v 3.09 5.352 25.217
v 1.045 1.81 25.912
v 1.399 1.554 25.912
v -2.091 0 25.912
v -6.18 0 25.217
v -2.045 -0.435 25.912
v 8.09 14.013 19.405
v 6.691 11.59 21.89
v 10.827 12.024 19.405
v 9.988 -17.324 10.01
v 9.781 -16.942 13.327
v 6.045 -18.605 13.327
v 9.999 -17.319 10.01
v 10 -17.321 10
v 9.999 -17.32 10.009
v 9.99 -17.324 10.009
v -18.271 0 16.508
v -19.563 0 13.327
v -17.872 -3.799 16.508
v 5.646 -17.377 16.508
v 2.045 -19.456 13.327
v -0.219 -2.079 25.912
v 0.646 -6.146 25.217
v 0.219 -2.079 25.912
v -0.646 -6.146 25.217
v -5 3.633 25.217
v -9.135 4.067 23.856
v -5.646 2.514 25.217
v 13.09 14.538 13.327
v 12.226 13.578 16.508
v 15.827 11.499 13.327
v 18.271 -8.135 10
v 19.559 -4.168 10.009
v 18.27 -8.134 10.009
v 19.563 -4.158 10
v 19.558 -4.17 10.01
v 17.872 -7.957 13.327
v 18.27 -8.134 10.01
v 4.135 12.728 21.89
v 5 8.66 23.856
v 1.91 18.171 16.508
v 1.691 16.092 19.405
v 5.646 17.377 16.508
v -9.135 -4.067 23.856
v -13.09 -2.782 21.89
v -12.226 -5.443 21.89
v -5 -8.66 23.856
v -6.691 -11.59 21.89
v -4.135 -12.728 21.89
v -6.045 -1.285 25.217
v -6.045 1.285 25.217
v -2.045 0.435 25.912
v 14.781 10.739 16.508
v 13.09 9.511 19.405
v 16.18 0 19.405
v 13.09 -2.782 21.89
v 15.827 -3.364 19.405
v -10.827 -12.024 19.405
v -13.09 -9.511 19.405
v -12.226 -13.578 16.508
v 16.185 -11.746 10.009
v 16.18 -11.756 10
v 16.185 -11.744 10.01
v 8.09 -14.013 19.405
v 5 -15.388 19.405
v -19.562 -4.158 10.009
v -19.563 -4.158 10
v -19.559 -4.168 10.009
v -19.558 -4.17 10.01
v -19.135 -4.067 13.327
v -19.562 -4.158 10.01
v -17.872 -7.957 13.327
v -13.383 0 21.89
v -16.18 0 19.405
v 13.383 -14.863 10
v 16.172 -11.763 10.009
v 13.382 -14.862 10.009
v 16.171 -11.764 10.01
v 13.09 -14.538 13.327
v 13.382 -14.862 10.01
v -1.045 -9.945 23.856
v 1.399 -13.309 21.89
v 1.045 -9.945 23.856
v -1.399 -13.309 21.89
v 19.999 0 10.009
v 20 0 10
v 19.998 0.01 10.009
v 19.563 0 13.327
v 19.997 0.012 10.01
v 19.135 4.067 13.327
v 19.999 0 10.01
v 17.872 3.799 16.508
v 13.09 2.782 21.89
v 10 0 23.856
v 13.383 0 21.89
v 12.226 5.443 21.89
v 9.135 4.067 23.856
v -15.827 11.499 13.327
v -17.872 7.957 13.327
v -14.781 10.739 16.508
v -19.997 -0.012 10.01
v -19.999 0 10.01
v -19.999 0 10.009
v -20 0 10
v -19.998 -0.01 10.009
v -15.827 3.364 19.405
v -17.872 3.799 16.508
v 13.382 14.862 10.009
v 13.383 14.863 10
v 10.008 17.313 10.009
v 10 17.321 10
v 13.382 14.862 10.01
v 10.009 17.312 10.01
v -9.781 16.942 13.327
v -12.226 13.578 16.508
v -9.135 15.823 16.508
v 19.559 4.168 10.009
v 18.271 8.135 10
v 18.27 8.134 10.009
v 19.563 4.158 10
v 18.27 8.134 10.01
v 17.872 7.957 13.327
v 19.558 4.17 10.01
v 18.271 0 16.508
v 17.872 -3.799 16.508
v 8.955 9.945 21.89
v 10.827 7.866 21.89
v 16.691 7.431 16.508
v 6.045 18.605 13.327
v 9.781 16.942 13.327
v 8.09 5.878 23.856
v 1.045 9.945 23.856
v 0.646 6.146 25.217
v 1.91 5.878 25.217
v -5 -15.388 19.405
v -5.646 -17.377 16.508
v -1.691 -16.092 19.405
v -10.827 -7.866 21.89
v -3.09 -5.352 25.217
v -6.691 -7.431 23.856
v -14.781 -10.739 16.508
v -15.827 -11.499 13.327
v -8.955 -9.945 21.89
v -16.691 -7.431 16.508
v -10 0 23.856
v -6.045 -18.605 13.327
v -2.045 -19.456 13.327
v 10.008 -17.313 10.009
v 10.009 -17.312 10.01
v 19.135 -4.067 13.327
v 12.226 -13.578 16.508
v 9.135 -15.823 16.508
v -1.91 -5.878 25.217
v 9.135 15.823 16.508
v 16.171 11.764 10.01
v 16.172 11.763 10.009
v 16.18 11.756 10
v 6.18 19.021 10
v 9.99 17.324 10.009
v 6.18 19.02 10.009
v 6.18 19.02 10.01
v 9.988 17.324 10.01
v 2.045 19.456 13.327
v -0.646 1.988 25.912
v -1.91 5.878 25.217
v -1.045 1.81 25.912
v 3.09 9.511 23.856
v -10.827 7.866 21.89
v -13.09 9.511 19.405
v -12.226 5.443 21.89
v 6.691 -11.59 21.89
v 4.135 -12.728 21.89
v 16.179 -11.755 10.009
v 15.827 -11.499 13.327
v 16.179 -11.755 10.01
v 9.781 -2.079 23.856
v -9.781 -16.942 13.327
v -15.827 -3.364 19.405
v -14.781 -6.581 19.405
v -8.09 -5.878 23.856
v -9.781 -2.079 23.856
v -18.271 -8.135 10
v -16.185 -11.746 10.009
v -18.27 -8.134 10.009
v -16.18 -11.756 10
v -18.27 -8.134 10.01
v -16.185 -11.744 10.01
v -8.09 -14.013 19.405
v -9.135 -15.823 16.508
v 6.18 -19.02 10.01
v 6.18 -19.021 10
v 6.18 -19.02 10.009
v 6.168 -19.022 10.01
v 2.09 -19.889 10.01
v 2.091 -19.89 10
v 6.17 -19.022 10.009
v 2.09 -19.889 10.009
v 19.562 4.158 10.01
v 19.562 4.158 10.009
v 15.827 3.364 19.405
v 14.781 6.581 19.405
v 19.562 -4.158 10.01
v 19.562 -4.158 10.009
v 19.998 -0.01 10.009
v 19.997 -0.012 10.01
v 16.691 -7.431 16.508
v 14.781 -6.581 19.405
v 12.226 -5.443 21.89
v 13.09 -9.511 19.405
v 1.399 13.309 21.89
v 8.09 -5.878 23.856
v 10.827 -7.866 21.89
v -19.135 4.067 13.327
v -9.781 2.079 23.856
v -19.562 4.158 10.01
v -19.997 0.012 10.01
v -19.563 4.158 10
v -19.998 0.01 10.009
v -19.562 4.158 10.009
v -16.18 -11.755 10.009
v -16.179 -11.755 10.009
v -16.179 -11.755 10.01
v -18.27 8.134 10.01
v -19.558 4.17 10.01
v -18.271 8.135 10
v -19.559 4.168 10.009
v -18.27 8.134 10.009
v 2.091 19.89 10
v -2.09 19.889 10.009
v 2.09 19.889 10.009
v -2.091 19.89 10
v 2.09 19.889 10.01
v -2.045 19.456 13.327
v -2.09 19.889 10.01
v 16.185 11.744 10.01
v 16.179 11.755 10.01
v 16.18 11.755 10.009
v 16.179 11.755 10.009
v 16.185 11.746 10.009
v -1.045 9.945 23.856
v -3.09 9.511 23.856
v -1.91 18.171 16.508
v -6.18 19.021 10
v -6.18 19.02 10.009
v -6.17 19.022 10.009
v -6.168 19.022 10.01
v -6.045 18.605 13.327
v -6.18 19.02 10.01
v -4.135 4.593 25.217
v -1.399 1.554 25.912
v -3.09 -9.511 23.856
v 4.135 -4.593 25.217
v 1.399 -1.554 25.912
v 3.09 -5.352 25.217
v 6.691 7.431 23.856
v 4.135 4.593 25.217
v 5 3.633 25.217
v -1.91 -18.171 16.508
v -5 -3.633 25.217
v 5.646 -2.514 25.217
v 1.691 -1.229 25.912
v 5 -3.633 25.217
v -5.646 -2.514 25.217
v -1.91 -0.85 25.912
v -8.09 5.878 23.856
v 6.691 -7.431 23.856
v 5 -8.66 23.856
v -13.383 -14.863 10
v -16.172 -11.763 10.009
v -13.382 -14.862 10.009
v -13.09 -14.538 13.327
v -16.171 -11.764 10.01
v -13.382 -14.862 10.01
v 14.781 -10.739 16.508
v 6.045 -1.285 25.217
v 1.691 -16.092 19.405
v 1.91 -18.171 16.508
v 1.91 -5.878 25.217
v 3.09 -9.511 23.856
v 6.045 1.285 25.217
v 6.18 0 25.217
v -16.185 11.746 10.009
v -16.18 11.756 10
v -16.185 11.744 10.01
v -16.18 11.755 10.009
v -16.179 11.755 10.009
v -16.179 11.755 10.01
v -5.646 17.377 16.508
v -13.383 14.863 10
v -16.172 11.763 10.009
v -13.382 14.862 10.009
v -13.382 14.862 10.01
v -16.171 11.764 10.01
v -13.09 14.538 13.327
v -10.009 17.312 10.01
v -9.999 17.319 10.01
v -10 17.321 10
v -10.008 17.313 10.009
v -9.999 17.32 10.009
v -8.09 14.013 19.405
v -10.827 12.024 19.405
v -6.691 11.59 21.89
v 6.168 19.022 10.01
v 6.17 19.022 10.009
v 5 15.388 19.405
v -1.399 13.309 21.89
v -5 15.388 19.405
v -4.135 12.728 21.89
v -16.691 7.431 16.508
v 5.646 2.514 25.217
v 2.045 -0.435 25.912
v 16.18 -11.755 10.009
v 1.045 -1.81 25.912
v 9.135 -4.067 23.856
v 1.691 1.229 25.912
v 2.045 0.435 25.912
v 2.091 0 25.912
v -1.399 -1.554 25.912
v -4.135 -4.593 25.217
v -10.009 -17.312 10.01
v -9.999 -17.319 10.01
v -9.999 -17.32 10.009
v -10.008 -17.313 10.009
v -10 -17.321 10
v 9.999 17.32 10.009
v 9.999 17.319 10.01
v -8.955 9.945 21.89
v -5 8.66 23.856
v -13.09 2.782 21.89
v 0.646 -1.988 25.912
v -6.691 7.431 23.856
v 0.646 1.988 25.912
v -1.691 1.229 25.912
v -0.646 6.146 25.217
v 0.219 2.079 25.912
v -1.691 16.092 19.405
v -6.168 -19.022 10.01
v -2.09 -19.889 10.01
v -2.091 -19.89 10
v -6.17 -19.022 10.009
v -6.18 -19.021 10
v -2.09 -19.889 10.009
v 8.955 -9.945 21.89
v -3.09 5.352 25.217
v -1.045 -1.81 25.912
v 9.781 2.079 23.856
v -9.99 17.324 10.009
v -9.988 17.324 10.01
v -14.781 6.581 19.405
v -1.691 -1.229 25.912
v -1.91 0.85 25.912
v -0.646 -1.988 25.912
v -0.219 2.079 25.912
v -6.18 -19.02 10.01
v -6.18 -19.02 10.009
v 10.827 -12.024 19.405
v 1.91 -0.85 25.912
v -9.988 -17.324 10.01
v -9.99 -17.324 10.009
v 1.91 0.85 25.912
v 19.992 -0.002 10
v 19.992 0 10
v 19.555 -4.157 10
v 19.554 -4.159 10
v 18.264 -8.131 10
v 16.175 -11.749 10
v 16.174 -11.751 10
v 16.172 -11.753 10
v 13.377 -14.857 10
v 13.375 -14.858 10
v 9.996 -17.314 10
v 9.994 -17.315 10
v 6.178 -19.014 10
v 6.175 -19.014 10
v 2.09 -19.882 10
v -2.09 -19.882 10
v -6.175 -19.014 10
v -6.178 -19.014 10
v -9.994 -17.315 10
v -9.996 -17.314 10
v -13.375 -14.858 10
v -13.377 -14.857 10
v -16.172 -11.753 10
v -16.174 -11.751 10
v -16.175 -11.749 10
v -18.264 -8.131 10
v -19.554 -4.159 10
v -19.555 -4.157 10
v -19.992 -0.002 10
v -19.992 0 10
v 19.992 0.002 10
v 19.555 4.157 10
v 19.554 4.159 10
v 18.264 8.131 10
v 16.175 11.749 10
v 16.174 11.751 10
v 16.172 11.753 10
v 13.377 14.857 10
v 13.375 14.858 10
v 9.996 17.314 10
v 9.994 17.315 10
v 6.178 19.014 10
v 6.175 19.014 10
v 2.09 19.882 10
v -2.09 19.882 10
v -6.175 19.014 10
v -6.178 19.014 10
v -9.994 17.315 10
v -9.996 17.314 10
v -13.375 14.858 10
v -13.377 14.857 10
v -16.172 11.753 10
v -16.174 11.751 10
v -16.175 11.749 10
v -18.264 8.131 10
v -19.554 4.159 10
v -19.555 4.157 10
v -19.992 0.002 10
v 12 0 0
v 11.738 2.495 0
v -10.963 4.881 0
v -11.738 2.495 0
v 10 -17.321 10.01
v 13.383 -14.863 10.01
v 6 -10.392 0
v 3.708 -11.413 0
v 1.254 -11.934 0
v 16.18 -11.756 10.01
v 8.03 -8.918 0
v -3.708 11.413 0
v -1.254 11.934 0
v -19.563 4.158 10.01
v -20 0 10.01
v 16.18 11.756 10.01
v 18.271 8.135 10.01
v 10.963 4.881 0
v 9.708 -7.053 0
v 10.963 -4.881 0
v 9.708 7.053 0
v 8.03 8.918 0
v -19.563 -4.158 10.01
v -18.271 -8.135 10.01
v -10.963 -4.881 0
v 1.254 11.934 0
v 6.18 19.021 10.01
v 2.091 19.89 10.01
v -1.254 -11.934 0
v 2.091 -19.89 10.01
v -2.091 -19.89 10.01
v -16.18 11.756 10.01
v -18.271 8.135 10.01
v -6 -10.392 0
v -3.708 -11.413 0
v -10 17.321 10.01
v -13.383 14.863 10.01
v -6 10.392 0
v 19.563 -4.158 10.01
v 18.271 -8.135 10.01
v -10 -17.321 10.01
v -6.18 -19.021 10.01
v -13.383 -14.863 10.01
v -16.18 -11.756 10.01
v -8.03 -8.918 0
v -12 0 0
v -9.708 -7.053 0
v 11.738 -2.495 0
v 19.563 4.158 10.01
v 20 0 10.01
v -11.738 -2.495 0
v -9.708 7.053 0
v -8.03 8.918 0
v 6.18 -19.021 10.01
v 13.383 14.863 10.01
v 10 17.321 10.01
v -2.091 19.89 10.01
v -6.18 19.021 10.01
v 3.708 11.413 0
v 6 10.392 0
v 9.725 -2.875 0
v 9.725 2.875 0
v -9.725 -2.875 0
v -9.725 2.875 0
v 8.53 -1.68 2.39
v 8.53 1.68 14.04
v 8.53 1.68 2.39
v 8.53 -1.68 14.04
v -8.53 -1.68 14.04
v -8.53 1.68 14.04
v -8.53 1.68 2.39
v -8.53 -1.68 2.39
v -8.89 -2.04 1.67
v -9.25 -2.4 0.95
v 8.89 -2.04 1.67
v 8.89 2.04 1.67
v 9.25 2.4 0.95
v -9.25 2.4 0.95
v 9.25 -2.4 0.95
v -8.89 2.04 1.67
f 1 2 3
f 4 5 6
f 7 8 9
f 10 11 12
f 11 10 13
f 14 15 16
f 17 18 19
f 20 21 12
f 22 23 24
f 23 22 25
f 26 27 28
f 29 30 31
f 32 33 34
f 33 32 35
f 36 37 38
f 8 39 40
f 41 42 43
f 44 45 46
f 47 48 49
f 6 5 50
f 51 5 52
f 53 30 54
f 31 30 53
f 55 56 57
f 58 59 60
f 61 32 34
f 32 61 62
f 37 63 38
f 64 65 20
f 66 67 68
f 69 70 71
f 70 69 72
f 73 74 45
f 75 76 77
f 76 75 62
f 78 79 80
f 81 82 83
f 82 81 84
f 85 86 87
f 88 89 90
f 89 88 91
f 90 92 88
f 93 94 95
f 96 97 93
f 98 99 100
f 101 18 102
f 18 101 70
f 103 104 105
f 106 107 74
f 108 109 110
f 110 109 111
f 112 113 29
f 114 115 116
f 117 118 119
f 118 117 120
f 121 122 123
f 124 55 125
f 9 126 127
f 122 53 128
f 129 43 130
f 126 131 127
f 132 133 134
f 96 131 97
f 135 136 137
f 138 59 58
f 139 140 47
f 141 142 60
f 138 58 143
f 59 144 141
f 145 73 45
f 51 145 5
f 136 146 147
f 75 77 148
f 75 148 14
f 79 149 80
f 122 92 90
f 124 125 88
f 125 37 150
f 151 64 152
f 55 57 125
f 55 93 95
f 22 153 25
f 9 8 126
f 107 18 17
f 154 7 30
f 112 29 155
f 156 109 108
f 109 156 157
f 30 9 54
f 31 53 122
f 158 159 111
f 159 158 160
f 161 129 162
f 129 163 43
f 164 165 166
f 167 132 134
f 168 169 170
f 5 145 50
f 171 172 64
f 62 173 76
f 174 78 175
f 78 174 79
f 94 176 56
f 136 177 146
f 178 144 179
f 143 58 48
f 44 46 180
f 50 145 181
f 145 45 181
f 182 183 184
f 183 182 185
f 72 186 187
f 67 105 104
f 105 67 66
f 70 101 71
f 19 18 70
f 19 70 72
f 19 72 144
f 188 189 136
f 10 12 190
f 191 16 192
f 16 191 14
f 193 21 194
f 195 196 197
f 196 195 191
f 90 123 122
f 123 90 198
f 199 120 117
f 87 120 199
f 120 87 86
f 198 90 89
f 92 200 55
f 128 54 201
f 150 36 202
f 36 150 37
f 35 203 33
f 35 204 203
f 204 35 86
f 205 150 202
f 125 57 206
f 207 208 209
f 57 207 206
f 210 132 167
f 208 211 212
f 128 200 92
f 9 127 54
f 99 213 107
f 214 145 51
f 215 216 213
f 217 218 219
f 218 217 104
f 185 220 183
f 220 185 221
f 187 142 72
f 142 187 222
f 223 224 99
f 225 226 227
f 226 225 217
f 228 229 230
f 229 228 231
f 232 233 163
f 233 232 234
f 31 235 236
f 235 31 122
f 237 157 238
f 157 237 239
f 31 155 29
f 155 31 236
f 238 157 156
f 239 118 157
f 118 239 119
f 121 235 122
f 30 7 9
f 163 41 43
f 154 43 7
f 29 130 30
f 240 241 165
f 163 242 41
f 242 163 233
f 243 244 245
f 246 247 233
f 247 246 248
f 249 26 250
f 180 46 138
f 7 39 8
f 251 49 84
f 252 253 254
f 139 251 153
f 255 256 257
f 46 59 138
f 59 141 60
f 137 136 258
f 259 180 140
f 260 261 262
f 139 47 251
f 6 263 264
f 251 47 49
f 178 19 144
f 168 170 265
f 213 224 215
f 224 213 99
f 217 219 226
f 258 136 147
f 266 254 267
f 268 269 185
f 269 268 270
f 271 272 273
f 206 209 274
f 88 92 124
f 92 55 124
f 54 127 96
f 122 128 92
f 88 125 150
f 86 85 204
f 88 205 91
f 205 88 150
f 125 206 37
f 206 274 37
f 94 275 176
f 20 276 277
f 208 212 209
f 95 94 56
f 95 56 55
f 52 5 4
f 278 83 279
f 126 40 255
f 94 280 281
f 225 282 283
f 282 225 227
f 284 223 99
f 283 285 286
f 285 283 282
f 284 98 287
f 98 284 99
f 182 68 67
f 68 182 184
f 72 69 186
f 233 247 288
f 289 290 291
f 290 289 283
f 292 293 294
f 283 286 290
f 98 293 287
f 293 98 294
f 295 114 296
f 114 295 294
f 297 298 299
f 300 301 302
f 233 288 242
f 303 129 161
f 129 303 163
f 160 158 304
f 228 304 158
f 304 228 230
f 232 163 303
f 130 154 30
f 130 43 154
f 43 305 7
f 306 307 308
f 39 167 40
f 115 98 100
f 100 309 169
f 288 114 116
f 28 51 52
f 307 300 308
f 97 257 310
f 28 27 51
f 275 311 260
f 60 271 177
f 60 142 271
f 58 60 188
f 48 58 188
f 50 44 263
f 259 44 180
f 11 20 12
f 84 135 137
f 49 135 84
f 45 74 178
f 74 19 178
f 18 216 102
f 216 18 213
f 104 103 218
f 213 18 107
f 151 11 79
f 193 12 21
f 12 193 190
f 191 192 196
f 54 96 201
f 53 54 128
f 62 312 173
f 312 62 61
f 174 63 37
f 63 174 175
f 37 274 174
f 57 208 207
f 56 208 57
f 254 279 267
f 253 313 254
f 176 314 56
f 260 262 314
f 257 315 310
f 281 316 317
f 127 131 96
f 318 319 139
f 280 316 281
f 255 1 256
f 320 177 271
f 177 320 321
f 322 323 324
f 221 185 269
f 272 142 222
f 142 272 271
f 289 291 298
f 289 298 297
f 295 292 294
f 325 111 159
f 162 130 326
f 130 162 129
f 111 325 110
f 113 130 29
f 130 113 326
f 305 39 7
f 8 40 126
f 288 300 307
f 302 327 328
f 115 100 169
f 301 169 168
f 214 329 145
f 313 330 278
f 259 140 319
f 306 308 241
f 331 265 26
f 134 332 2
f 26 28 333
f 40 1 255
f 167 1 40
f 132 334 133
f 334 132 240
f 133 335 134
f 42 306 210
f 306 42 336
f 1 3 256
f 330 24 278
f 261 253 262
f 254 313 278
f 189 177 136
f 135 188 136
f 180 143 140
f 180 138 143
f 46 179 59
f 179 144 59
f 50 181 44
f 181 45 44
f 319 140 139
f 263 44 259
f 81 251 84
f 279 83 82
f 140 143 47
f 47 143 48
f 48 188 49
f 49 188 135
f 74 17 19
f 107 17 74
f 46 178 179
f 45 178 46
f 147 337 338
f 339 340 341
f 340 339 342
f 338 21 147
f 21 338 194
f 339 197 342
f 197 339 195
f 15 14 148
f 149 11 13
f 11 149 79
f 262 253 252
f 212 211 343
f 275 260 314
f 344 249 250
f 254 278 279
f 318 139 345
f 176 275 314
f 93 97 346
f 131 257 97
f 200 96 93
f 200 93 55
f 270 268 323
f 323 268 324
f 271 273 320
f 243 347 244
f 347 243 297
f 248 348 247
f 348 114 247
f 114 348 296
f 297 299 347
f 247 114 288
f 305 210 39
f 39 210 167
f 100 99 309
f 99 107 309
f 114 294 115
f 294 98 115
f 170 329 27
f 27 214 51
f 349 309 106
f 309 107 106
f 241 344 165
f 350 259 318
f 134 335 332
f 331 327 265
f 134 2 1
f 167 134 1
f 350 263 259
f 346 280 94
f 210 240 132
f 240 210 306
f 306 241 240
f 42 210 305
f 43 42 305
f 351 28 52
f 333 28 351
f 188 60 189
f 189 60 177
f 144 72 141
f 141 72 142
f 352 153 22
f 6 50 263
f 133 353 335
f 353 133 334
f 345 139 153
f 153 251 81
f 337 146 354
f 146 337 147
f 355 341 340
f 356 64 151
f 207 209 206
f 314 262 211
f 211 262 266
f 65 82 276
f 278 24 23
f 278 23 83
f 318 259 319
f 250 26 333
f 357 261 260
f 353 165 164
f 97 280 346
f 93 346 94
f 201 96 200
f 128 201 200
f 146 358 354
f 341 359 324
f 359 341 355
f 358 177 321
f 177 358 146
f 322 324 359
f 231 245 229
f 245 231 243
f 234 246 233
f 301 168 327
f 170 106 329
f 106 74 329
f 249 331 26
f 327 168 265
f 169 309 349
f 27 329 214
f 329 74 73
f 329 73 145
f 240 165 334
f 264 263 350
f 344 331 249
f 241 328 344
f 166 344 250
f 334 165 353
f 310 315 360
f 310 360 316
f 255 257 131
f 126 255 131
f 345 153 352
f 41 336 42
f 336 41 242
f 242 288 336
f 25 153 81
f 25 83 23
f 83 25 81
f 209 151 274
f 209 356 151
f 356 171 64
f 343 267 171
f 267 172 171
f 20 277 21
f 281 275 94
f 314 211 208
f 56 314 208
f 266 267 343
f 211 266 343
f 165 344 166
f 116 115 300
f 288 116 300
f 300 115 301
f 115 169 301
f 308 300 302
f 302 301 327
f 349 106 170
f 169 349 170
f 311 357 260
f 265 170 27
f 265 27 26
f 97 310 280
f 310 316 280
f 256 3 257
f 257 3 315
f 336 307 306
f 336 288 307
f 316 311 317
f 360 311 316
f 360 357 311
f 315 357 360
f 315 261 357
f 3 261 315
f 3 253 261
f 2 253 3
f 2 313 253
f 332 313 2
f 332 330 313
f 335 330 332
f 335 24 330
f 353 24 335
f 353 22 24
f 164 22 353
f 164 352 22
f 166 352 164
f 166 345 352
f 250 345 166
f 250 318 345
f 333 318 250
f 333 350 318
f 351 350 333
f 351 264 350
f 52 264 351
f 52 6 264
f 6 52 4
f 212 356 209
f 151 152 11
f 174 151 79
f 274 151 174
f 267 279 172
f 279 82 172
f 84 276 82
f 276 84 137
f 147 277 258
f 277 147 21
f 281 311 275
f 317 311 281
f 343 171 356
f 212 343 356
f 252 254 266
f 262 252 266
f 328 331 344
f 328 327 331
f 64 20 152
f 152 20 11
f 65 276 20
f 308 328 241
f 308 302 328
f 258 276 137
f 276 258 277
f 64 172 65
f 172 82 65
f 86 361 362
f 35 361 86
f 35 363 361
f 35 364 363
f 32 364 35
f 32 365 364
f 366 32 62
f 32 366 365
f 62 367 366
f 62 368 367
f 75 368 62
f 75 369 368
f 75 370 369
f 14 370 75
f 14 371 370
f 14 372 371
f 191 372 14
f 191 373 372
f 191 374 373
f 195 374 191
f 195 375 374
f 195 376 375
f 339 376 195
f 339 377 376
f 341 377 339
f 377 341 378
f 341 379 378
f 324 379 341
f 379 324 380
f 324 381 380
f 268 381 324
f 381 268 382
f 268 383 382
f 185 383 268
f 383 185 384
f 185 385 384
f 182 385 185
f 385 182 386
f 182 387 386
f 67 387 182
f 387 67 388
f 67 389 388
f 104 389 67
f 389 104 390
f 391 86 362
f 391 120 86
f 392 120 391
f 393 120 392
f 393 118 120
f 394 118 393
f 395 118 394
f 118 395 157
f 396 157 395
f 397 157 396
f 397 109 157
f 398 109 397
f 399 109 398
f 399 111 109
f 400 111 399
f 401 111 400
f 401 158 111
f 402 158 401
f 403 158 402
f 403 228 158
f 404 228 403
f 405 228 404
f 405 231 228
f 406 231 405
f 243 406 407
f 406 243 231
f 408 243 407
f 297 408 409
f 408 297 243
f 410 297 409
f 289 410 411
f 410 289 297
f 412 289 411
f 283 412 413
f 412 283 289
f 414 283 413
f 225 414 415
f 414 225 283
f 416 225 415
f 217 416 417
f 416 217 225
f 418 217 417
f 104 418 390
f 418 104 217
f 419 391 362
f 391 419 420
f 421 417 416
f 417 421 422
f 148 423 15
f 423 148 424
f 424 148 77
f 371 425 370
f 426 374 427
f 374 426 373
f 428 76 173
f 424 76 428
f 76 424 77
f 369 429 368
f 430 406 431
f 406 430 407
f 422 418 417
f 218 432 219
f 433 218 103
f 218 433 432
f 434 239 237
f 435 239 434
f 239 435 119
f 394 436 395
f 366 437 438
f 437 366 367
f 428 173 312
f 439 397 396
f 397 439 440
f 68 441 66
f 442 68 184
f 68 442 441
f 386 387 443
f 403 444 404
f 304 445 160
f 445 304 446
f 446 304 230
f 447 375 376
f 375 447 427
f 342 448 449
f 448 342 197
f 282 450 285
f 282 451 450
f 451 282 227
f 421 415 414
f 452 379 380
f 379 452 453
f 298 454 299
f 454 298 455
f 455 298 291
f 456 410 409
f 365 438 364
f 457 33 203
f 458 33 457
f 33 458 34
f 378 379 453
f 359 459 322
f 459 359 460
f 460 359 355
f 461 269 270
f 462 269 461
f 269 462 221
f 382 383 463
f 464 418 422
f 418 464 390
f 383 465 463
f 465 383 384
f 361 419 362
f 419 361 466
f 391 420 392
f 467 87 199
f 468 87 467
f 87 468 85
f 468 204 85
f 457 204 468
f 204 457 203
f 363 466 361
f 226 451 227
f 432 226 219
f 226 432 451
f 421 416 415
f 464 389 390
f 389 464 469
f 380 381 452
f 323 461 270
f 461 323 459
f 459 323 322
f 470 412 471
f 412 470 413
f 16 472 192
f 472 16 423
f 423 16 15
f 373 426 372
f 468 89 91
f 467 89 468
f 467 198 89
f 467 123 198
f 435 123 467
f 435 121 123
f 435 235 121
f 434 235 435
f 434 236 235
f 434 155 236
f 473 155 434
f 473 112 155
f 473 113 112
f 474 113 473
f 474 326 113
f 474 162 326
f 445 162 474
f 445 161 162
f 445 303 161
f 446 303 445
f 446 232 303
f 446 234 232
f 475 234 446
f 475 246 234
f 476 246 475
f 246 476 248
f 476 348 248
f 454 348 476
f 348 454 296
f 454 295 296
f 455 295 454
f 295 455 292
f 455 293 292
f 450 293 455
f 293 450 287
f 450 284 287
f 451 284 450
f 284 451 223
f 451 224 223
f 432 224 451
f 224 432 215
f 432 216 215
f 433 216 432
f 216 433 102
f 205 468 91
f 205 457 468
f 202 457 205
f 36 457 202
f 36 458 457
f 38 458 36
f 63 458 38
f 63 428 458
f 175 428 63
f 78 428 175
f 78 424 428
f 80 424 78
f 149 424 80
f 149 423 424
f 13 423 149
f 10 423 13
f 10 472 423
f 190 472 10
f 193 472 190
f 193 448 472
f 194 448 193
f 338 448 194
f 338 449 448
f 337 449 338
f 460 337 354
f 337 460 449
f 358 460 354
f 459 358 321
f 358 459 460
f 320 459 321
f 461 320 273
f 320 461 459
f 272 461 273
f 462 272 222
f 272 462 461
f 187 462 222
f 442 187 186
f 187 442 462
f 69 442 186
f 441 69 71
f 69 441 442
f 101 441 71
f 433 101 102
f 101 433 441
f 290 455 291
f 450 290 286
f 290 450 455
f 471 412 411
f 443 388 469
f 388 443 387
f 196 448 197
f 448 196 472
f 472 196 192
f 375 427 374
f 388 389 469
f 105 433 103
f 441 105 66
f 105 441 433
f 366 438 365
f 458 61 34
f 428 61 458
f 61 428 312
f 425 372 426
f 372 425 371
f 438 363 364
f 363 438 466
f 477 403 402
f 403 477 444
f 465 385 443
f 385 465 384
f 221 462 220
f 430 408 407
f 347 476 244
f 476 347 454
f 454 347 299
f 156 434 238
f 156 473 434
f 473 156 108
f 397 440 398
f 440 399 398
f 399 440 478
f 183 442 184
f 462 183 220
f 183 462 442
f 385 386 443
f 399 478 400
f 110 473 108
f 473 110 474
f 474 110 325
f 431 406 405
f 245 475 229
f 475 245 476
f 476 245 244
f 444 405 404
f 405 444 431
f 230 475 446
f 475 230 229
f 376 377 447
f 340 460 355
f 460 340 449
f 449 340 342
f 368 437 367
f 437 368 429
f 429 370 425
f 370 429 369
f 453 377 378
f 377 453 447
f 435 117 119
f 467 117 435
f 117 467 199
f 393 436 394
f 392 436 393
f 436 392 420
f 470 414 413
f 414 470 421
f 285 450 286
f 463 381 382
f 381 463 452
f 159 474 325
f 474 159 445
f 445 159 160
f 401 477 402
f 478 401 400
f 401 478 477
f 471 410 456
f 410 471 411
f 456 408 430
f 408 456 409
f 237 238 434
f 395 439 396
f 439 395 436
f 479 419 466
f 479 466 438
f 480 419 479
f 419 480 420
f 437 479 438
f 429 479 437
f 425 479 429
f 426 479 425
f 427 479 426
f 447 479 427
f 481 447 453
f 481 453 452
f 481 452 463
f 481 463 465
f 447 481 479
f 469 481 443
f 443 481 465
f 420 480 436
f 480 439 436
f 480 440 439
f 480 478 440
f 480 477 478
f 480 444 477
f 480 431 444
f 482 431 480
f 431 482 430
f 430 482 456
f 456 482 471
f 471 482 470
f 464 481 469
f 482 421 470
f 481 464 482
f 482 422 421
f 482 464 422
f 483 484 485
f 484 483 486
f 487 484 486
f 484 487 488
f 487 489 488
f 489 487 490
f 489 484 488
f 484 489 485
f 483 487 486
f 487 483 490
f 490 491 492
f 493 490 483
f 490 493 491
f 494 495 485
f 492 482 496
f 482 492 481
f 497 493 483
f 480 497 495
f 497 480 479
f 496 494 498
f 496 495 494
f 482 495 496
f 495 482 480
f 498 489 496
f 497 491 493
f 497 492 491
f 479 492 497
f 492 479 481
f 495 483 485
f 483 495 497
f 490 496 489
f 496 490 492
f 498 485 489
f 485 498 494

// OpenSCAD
// file: triangulation.scad
function _furthestAwayFromPoint(points,poly,z,bestD=-1,bestPos=0,pos=0) = 
    len(poly) <= pos ? bestPos :
    norm(points[poly[pos]]-z) > bestD ? _furthestAwayFromPoint(points,poly,z,bestD=norm(points[poly[pos]]-z),bestPos=pos,pos=pos+1) :
    _furthestAwayFromPoint(points,poly,z,bestD=bestD,bestPos=bestPos,pos=pos+1);
    
function _triangleArea(a,b,c) = let(cr=cross(b-a,c-a)/2)
        is_num(cr) ? abs(cr) : norm(cr);
    
function _furthestAwayFromLine(points,poly,z1,z2,bestArea=-1,bestPos=0,pos=0) = 
    len(poly) <= pos ? bestPos :
    _triangleArea(z1,z2,points[poly[pos]]) > bestArea ? _furthestAwayFromLine(points,poly,z1,z2,bestArea=_triangleArea(z1,z2,points[poly[pos]]),bestPos=pos,pos=pos+1) :
    _furthestAwayFromLine(points,poly,z1,z2,bestArea=bestArea,bestPos=bestPos,pos=pos+1);
    
function normalize(v) = v/norm(v);

function _winding(points,poly,sum=0,pos=0) =
    pos >= len(poly) ? sum :
    _winding(points,poly,sum=sum+(points[poly[(pos+1)%len(poly)]][0]-points[poly[pos]][0])*(points[poly[(pos+1)%len(poly)]][1]+points[poly[pos]][1]),pos=pos+1);

function _isCCW(points,poly) =
_winding(points,poly) < 0;

function identifyPlane(points,poly) = 
let(i=_furthestAwayFromPoint(points,poly,points[poly[0]]),
           j=_furthestAwayFromLine(points,poly,points[poly[0]],points[poly[i]]),
           normal = cross(points[poly[i]]-points[poly[0]],points[poly[j]]-points[poly[0]]),
           a = points[poly[i]]-points[poly[0]],
           b = cross(normal,a),
           cs = [points[poly[0]],normalize(a),normalize(b),normalize(normal)])
           cs;
                      
function projectPoint(coordsys,p) = let(v=p-coordsys[0],
           vp=v-(v*coordsys[3])*coordsys[3]) [vp*coordsys[1],vp*coordsys[2]];
           
function projectPoints(coordsys,p) = [for(v=p) projectPoint(coordsys,v)];
    
function _removeDuplicates(points,poly)
    = [for (i=[0:len(poly)-1]) if (points[poly[(i+1)%len(poly)]] != points[poly[i]]) poly[i]];
    
function triangulate(points,poly=undef,holes=[]) = 
    let(poly = poly==undef ? [for(i=[0:1:len(points)-1]) i] : poly)
    let(poly = _removeDuplicates(points,poly),
        holes = [for(h=holes) _removeDuplicates(points,h)])
    len(points[poly[0]]) == 2 ?triangulate2D(points,poly,holes) : triangulate2D(projectPoints(identifyPlane(points,poly),points),poly,holes);
    
function _leftMostHoleData(points,holes,indexOfHole=0,indexInHole=0,bestData=undef,) =
    indexOfHole >= len(holes) ? bestData[1] :
    indexInHole >= len(holes[indexOfHole]) ? _leftMostHoleData(points,holes,indexOfHole=indexOfHole+1,indexInHole=0,bestData=bestData) :
    bestData==undef || points[holes[indexOfHole][indexInHole]][0] < bestData[0] ? _leftMostHoleData(points,holes,indexOfHole=indexOfHole,indexInHole=indexInHole+1,bestData=[points[holes[indexOfHole][indexInHole]][0], [indexOfHole, indexInHole]]) :
    _leftMostHoleData(points,holes,indexOfHole=indexOfHole,indexInHole=indexInHole+1,bestData=bestData);
    
function _rightMostPrimaryData(points,primary,limitX,pos=0,bestData=undef) =   
    pos >= len(primary) ?  bestData[1] :    
    points[primary[pos]][0] < limitX && (bestData==undef || points[primary[pos]] > bestData[0]) ?  _rightMostPrimaryData(points,primary,limitX,pos=pos+1,bestData=[points[primary[pos]][0],pos]) :
    _rightMostPrimaryData(points,primary,limitX,pos=pos+1,bestData=bestData);

function _makeLoop(start,loop,index) = concat([start],[for(i=[0:len(loop)]) loop[(i+index)%len(loop)]],[start]);

function _addLoop(primary,holes,indexWithinPrimary,indexOfHole,indexWithinHole) = 
    let(hole=holes[indexOfHole],
        newHoles=[for(i=[0:len(holes)-1]) if(i!=indexOfHole) holes[i]],
        newPrimary=[for(i=[0:len(primary)-1]) for(p= i!=indexWithinPrimary ? [primary[i]] : _makeLoop(primary[i],hole,indexWithinHole)) p])
       [newPrimary,newHoles];
        
function _removeHoles1(points,primary,holes) =
    len(holes) == 0 ? primary :
    let(holeData=_leftMostHoleData(points,holes),
        indexOfHole=holeData[0],
        indexWithinHole=holeData[1],
        holePointIndex=holes[indexOfHole][indexWithinHole],
        hp=points[holePointIndex],
        indexWithinPrimary=_rightMostPrimaryData(points,primary,hp[0]),
        primaryAndHoles=_addLoop(primary,holes,indexWithinPrimary,indexOfHole,indexWithinHole)) _removeHoles1(points,primaryAndHoles[0],primaryAndHoles[1]);   
        
function _removeHolesAndReorient(points,primary,holes) =    let(points=_isCCW(points,primary)?points:[for(p=points) [p[0],-p[1]]])
        [points,_removeHoles1(points,primary,[for(h=holes) _orient(newPoints,h,ccw=false)])];

function mod(a,b) = let(m=a%b) m < 0 ? m+b : m;

function _delPoint(v,i) = [for(j=[0:1:len(v)-1]) if(i!=j) v[j]];
    
function _isCCWTriangle(a,b,c) = cross(b-a,c-a) >= 0;
    
function _crosses(points,poly,a,b,ignore,pos=0) =     
    pos >= len(poly) ? false :
    ignore != pos && ignore !=  mod(pos+1,len(poly)) && _isCross(points[poly[pos]],points[poly[mod(pos+1,len(poly))]],a,b) ? true : _crosses(points,poly,a,b,pos=pos+1);

function _isReflex(points,poly,i) = 
    let(n=len(poly),
        a=points[poly[mod(i-1,n)]],
        b=points[poly[i]],
        c=points[poly[mod(i+1,n)]]) cross(b-a,c-b) < 0;
                
function _checkEar2(points,poly,a,b,c,j) = 
   let(p=points[poly[mod(j,len(poly))]],
       c1=cross(p-a,b-a))
       ! ( c1*cross(p-b,c-b) >0 && c1*cross(p-c,a-c)>0 );
                
function _checkEar(points,poly,a,b,c,i,j) =
    mod(j,len(poly))==mod(i-1,len(poly)) ? true :
    _isReflex(points,poly,mod(j,len(poly))) && ! _checkEar2(points,poly,a,b,c,j) ? false :
    _checkEar(points,poly,a,b,c,i,j+1);

function _isEar(points,poly,i) = 
    _isReflex(points,poly,i) ? false :
    let(n=len(poly),
        a=points[poly[mod(i-1,n)]],
        b=points[poly[i]],
        c=points[poly[mod(i+1,n)]],
        j=i+2)
        _checkEar(points,poly,a,b,c,i,i+2);        

function _findEar(points,poly,pos=0) =
    assert(pos<len(poly))
    _isEar(points,poly,pos) ? pos : _findEar(points,poly,pos=pos+1);

function _cutEar(points,poly) = 
    let(n=len(poly),
        i=_findEar(points,poly))
        _delPoint(poly,i);
            
function _getEar(points,poly) = 
    let(n=len(poly),
        i=_findEar(points,poly))
        [poly[mod(i-1,n)],poly[i],poly[mod(i+1,n)]];
        
function _reverse(v) = [for(i=[len(v)-1:-1:0]) v[i]];
    
function _orient(points,poly,ccw=true) = !!_isCCW(points,poly) == ccw ? poly : _reverse(poly);

function triangulate2D(points,poly,holes=[],soFar=[]) =
    let(pp = _removeHolesAndReorient(points,poly,holes),
    points=pp[0],
    poly=pp[1])
    len(poly) == 3 ? concat(soFar,[poly]) :
    triangulate2D(points,_cutEar(points,poly),soFar=concat(soFar,[_getEar(points,poly)]));
    
module showMesh(points,tt,width=1) 
{
    for(t=tt) {
        for(i=[0:1:len(t)-1]) {
            hull() {
                translate(points[t[i]]) sphere(d=width);
                translate(points[t[(i+1)%len(t)]]) sphere(d=width);
            }
        }
    }
}

function _find(needle,haystack) = let(f=search([needle], haystack)) f==[[]] ? undef : f[0];

function _refineTriangle(triangle,maxEdge) =
    let(a = triangle[0],
        b = triangle[1],
        c = triangle[2],
        ab = norm(a-b),
        bc = norm(b-c),
        ca = norm(c-a))
        ab <= maxEdge && bc <= maxEdge && ca <= maxEdge ? [triangle] :
        ab > maxEdge && bc > maxEdge && ca > maxEdge ? [[a,(a+b)/2,(a+c)/2],[b,(b+c)/2,(a+b)/2],[c,(a+c)/2,(b+c)/2],[(a+c)/2,(a+b)/2,(b+c)/2]] :
    ab > maxEdge && bc > maxEdge ? [[b,(b+c)/2,(a+b)/2],[a,(a+b)/2,(b+c)/2],[c,a,(b+c)/2]] :
    bc > maxEdge && ca > maxEdge ? [[c,(c+a)/2,(b+c)/2],[b,(b+c)/2,(c+a)/2],[a,b,(c+a)/2]] :
    ca > maxEdge && ab > maxEdge ? [[a,(a+b)/2,(c+a)/2],[c,(c+a)/2,(a+b)/2],[b,c,(a+b)/2]] :
    ab > maxEdge ? [[a,(a+b)/2,c],[(a+b)/2,b,c]] :
    bc > maxEdge ? [[b,(b+c)/2,a],[(b+c)/2,c,a]] :
    /*ca > maxEdge */ [[c,(c+a)/2,b],[(c+a)/2,a,b]];

function _refineMesh1(triangles,maxEdge,pos=0,newTriangles=[]) =
    pos >= len(triangles) ? newTriangles :
    _refineMesh1(triangles,maxEdge,pos=pos+1,newTriangles=concat(newTriangles,_refineTriangle(triangles[pos],maxEdge)));
    
/* simpler but slower */
function _refineMesh1(triangles,maxEdge) =
    [for(t=triangles) for(tr=_refineTriangle(t,maxEdge)) tr];


function _maxEdge(faces) = max([for(f=faces) for(i=[0:len(f)-1]) norm(f[(i+1)%len(f)]-f[i])]);

function _refineMeshN(triangles,maxEdge,n=0) =
    n <= 0 ? triangles : _refineMeshN(_refineMesh1(triangles,maxEdge),maxEdge,n=n-1);
    
function _newPointsAndFaces(pointsAndFaces,face,faceSoFar=[]) =
    let(pos=len(faceSoFar),
        points=pointsAndFaces[0],
        faces=pointsAndFaces[1]
    )
    pos >= len(face) ? [points,concat(faces,[faceSoFar])] :
    let(v=face[pos],
        i=_find(v,points)) i==undef ? _newPointsAndFaces([concat(points,[v]),faces],face,faceSoFar=concat(faceSoFar,[len(points)])) : _newPointsAndFaces(pointsAndFaces,face,faceSoFar=concat(faceSoFar,[i]));            
        
function _toPointsAndFaces(faces,pointsAndFaces=[[],[]], pos=0) =
    pos >= len(faces) ? pointsAndFaces :
    _toPointsAndFaces(faces,_newPointsAndFaces(pointsAndFaces,faces[pos]),pos=pos+1);
    
function refineMesh(mesh=undef,points=[],triangles=[],maxEdge=5) =
    let(
        points=mesh==undef?points:mesh[0],
        triangles=mesh==undef?triangles:mesh[1],
        tris = [for (t=triangles) [for (v=t) points[v]]],
        longestEdge = _maxEdge(tris),
        n = ceil(ln(longestEdge/maxEdge)/ln(2)),
        newTris = _refineMeshN(tris, maxEdge, n)) _toPointsAndFaces(newTris);
    
function _cutZ(a,b,z,normal) =
    let(an = a*normal)
        an == z ? a :
        let(bn = b*normal)
        bn == z ? b :
        let(t=(z-a*normal)/(b*normal-a*normal))
        (1-t)*a+t*b;
    
function _cutTriangle0(t, z, normal) = 
    /* cut lines joining vertex 0 to others */
    t[1]*normal == z ?
    let(cut02 = _cutZ(t[0],t[2],z,normal))
    [[cut02,t[0],t[1]],[cut02,t[1],t[2]]] :
    t[2][2] == z ?
    let(cut01 = _cutZ(t[0],t[1],z,normal))
    [[cut01,t[2],t[0]],[cut01,t[1],t[2]]] :
    let(cut01 = _cutZ(t[0],t[1],z,normal),
        cut02 = _cutZ(t[0],t[2],z,normal))
    [[cut02,t[0],cut01],
     [t[1],t[2],cut02],
     [cut02,cut01,t[1]]];

function _cutTriangle(t,z,normal) = 
    (t[0]*normal <= z && t[1]*normal <= z && t[2]*normal <= z) || (t[0]*normal >= z && t[1]*normal >= z && t[2]*normal >= z ) ? [t] :
    (t[0]*normal >= z && t[1]*normal >= z) || (t[0]*normal <= z && t[1]*normal <= z) ? _cutTriangle0([t[2],t[0],t[1]], z,normal) :
    (t[1]*normal >= z && t[2]*normal >= z) || (t[1]*normal <= z && t[2]*normal <= z) ? _cutTriangle0(t, z, normal) :
    _cutTriangle0([t[1],t[2],t[0]],z, normal);

function cutMesh(mesh=undef,points=[],triangles=[],slice=0,normal=[1,0,0]) =
        sliceMesh(mesh=mesh,points=points,triangles=triangles,slices=[slice],normal=normal);
            
function _normalize(v) = 
    let(vv = 
        v[0] == 0 && v[1] == 0 ? [0,0,sign(v[2])] :
        v[0] == 0 && v[2] == 0 ? [0,sign(v[1]),0] :
        v[1] == 0 && v[2] == 0 ? [sign(v[0]),0,0] :
        v / norm(v))
        [for(i=[0:1:len(v)-1]) vv[i]];
            
function _sliceTriangles(triangles,slices,normal,pos=0) =
    pos >= len(slices) ? triangles :
    _sliceTriangles([for(t=triangles) for(s=_cutTriangle(t,slices[pos],normal)) s],slices,normal,pos=pos+1);
        
function _makeSlices(points,triangles,slices,normal,spacing) =
    slices != undef ? slices :
    let(zs = [for(t=triangles) for(v=t) points[v]*normal],
        zMin = min(zs),
        zMax = max(zs),
        n = ceil((zMax-zMin) / spacing)-1)
        echo(n)n <= 0 ? [] :
        [for(i=[1:1:n]) zMin+i*spacing];    

function sliceMesh(mesh=undef,points=[],triangles=[],slices=undef,spacing=undef,normal=[1,0,0]) =
        let(points=mesh==undef?points:mesh[0],triangles=mesh==undef?triangles:mesh[1],
        normal=_normalize(normal),
        slices=_makeSlices(points,triangles,slices,normal,spacing))
        _toPointsAndFaces(_sliceTriangles([for(t=triangles) [for (v=t) points[v]]],slices,normal));
            
function _origin(dimensions) = [for(i=[0:1:dimensions-1]) 0];        
            
function _cmCalc(points,triangles,pos=0,weightedSum=undef,sumWeights=0) =
        pos >= len(triangles) ?  weightedSum/sumWeights :
        _cmCalc(points,triangles,pos=pos+1,weightedSum=(weightedSum==undef?_origin(len(points[0])):weightedSum)+_triangleArea(points[triangles[pos][0]],points[triangles[pos][1]],points[triangles[pos][2]])*(points[triangles[pos][0]]+points[triangles[pos][1]]+points[triangles[pos][2]])/3,sumWeights=sumWeights+_triangleArea(points[triangles[pos][0]],points[triangles[pos][1]],points[triangles[pos][2]]));
    
function centerOfMass(mesh=undef,points=[],triangles=[]) =
        let(points=mesh==undef?points:mesh[0],triangles=mesh==undef?triangles:mesh[1])
        _cmCalc(points,triangles);
        
//<skip>
/*
function testPoly2(n) = concat([for(i=[0:n-1]) 20*[cos(i*360/n),rands(-.3,.3,1)[0],sin(i*360/n)]],[for(i=[0:n-1]) 20*[0.8*cos(i*360/n),rands(-.3,.3,1)[0],-0.8*sin(i*360/n)]]);

testPoints=testPoly2(11);
tt = triangulate(testPoints);
m = refineMesh(points=testPoints,triangles=tt,maxEdge=5);
showMesh(m[0],m[1],width=.2);
*/
//</skip>
// main file
use <tubemesh.scad>;

//<params>
slotTolerance = 0.08;
slotWidth = 16.9;
slotThickness = 3.2;
slotHeight = 14;
bottomSlotExtra = 1.2;
baseDiameter = 24;
baseHeight = 10;
sphereDiameter = 40;
verticalSphereStretch = 0.8;
//</params>

module dummy() {}

nudge = 0.01;

module hemisphere(d=10,r=undef) {
    intersection() {
        sphere(d=d,r=r);
        translate([0,0,d/2+5]) cube((d==undef?2*r:d)+10,center=true);
    }
}

module mushroom() {
    cylinder(d1=baseDiameter, d2=sphereDiameter, h=baseHeight+nudge);
    translate([0,0,baseHeight]) scale([1,1,verticalSphereStretch]) hemisphere(d=sphereDiameter);
}

function rectangle(w,h) =
    [ [-w/2,-h/2], [w/2,-h/2], [w/2,h/2], [-w/2,h/2] ];

difference() {
    mushroom();
    cube([slotWidth+2*slotTolerance,slotThickness+2*slotTolerance,2*slotHeight+slotTolerance], center=true);
    translate([0,0,-nudge])
    morphExtrude(rectangle(slotWidth+2*slotTolerance+2*bottomSlotExtra,slotThickness+2*slotTolerance+2*bottomSlotExtra), rectangle(slotWidth+2*slotTolerance,slotThickness+2*slotTolerance), height=2*bottomSlotExtra);
}
